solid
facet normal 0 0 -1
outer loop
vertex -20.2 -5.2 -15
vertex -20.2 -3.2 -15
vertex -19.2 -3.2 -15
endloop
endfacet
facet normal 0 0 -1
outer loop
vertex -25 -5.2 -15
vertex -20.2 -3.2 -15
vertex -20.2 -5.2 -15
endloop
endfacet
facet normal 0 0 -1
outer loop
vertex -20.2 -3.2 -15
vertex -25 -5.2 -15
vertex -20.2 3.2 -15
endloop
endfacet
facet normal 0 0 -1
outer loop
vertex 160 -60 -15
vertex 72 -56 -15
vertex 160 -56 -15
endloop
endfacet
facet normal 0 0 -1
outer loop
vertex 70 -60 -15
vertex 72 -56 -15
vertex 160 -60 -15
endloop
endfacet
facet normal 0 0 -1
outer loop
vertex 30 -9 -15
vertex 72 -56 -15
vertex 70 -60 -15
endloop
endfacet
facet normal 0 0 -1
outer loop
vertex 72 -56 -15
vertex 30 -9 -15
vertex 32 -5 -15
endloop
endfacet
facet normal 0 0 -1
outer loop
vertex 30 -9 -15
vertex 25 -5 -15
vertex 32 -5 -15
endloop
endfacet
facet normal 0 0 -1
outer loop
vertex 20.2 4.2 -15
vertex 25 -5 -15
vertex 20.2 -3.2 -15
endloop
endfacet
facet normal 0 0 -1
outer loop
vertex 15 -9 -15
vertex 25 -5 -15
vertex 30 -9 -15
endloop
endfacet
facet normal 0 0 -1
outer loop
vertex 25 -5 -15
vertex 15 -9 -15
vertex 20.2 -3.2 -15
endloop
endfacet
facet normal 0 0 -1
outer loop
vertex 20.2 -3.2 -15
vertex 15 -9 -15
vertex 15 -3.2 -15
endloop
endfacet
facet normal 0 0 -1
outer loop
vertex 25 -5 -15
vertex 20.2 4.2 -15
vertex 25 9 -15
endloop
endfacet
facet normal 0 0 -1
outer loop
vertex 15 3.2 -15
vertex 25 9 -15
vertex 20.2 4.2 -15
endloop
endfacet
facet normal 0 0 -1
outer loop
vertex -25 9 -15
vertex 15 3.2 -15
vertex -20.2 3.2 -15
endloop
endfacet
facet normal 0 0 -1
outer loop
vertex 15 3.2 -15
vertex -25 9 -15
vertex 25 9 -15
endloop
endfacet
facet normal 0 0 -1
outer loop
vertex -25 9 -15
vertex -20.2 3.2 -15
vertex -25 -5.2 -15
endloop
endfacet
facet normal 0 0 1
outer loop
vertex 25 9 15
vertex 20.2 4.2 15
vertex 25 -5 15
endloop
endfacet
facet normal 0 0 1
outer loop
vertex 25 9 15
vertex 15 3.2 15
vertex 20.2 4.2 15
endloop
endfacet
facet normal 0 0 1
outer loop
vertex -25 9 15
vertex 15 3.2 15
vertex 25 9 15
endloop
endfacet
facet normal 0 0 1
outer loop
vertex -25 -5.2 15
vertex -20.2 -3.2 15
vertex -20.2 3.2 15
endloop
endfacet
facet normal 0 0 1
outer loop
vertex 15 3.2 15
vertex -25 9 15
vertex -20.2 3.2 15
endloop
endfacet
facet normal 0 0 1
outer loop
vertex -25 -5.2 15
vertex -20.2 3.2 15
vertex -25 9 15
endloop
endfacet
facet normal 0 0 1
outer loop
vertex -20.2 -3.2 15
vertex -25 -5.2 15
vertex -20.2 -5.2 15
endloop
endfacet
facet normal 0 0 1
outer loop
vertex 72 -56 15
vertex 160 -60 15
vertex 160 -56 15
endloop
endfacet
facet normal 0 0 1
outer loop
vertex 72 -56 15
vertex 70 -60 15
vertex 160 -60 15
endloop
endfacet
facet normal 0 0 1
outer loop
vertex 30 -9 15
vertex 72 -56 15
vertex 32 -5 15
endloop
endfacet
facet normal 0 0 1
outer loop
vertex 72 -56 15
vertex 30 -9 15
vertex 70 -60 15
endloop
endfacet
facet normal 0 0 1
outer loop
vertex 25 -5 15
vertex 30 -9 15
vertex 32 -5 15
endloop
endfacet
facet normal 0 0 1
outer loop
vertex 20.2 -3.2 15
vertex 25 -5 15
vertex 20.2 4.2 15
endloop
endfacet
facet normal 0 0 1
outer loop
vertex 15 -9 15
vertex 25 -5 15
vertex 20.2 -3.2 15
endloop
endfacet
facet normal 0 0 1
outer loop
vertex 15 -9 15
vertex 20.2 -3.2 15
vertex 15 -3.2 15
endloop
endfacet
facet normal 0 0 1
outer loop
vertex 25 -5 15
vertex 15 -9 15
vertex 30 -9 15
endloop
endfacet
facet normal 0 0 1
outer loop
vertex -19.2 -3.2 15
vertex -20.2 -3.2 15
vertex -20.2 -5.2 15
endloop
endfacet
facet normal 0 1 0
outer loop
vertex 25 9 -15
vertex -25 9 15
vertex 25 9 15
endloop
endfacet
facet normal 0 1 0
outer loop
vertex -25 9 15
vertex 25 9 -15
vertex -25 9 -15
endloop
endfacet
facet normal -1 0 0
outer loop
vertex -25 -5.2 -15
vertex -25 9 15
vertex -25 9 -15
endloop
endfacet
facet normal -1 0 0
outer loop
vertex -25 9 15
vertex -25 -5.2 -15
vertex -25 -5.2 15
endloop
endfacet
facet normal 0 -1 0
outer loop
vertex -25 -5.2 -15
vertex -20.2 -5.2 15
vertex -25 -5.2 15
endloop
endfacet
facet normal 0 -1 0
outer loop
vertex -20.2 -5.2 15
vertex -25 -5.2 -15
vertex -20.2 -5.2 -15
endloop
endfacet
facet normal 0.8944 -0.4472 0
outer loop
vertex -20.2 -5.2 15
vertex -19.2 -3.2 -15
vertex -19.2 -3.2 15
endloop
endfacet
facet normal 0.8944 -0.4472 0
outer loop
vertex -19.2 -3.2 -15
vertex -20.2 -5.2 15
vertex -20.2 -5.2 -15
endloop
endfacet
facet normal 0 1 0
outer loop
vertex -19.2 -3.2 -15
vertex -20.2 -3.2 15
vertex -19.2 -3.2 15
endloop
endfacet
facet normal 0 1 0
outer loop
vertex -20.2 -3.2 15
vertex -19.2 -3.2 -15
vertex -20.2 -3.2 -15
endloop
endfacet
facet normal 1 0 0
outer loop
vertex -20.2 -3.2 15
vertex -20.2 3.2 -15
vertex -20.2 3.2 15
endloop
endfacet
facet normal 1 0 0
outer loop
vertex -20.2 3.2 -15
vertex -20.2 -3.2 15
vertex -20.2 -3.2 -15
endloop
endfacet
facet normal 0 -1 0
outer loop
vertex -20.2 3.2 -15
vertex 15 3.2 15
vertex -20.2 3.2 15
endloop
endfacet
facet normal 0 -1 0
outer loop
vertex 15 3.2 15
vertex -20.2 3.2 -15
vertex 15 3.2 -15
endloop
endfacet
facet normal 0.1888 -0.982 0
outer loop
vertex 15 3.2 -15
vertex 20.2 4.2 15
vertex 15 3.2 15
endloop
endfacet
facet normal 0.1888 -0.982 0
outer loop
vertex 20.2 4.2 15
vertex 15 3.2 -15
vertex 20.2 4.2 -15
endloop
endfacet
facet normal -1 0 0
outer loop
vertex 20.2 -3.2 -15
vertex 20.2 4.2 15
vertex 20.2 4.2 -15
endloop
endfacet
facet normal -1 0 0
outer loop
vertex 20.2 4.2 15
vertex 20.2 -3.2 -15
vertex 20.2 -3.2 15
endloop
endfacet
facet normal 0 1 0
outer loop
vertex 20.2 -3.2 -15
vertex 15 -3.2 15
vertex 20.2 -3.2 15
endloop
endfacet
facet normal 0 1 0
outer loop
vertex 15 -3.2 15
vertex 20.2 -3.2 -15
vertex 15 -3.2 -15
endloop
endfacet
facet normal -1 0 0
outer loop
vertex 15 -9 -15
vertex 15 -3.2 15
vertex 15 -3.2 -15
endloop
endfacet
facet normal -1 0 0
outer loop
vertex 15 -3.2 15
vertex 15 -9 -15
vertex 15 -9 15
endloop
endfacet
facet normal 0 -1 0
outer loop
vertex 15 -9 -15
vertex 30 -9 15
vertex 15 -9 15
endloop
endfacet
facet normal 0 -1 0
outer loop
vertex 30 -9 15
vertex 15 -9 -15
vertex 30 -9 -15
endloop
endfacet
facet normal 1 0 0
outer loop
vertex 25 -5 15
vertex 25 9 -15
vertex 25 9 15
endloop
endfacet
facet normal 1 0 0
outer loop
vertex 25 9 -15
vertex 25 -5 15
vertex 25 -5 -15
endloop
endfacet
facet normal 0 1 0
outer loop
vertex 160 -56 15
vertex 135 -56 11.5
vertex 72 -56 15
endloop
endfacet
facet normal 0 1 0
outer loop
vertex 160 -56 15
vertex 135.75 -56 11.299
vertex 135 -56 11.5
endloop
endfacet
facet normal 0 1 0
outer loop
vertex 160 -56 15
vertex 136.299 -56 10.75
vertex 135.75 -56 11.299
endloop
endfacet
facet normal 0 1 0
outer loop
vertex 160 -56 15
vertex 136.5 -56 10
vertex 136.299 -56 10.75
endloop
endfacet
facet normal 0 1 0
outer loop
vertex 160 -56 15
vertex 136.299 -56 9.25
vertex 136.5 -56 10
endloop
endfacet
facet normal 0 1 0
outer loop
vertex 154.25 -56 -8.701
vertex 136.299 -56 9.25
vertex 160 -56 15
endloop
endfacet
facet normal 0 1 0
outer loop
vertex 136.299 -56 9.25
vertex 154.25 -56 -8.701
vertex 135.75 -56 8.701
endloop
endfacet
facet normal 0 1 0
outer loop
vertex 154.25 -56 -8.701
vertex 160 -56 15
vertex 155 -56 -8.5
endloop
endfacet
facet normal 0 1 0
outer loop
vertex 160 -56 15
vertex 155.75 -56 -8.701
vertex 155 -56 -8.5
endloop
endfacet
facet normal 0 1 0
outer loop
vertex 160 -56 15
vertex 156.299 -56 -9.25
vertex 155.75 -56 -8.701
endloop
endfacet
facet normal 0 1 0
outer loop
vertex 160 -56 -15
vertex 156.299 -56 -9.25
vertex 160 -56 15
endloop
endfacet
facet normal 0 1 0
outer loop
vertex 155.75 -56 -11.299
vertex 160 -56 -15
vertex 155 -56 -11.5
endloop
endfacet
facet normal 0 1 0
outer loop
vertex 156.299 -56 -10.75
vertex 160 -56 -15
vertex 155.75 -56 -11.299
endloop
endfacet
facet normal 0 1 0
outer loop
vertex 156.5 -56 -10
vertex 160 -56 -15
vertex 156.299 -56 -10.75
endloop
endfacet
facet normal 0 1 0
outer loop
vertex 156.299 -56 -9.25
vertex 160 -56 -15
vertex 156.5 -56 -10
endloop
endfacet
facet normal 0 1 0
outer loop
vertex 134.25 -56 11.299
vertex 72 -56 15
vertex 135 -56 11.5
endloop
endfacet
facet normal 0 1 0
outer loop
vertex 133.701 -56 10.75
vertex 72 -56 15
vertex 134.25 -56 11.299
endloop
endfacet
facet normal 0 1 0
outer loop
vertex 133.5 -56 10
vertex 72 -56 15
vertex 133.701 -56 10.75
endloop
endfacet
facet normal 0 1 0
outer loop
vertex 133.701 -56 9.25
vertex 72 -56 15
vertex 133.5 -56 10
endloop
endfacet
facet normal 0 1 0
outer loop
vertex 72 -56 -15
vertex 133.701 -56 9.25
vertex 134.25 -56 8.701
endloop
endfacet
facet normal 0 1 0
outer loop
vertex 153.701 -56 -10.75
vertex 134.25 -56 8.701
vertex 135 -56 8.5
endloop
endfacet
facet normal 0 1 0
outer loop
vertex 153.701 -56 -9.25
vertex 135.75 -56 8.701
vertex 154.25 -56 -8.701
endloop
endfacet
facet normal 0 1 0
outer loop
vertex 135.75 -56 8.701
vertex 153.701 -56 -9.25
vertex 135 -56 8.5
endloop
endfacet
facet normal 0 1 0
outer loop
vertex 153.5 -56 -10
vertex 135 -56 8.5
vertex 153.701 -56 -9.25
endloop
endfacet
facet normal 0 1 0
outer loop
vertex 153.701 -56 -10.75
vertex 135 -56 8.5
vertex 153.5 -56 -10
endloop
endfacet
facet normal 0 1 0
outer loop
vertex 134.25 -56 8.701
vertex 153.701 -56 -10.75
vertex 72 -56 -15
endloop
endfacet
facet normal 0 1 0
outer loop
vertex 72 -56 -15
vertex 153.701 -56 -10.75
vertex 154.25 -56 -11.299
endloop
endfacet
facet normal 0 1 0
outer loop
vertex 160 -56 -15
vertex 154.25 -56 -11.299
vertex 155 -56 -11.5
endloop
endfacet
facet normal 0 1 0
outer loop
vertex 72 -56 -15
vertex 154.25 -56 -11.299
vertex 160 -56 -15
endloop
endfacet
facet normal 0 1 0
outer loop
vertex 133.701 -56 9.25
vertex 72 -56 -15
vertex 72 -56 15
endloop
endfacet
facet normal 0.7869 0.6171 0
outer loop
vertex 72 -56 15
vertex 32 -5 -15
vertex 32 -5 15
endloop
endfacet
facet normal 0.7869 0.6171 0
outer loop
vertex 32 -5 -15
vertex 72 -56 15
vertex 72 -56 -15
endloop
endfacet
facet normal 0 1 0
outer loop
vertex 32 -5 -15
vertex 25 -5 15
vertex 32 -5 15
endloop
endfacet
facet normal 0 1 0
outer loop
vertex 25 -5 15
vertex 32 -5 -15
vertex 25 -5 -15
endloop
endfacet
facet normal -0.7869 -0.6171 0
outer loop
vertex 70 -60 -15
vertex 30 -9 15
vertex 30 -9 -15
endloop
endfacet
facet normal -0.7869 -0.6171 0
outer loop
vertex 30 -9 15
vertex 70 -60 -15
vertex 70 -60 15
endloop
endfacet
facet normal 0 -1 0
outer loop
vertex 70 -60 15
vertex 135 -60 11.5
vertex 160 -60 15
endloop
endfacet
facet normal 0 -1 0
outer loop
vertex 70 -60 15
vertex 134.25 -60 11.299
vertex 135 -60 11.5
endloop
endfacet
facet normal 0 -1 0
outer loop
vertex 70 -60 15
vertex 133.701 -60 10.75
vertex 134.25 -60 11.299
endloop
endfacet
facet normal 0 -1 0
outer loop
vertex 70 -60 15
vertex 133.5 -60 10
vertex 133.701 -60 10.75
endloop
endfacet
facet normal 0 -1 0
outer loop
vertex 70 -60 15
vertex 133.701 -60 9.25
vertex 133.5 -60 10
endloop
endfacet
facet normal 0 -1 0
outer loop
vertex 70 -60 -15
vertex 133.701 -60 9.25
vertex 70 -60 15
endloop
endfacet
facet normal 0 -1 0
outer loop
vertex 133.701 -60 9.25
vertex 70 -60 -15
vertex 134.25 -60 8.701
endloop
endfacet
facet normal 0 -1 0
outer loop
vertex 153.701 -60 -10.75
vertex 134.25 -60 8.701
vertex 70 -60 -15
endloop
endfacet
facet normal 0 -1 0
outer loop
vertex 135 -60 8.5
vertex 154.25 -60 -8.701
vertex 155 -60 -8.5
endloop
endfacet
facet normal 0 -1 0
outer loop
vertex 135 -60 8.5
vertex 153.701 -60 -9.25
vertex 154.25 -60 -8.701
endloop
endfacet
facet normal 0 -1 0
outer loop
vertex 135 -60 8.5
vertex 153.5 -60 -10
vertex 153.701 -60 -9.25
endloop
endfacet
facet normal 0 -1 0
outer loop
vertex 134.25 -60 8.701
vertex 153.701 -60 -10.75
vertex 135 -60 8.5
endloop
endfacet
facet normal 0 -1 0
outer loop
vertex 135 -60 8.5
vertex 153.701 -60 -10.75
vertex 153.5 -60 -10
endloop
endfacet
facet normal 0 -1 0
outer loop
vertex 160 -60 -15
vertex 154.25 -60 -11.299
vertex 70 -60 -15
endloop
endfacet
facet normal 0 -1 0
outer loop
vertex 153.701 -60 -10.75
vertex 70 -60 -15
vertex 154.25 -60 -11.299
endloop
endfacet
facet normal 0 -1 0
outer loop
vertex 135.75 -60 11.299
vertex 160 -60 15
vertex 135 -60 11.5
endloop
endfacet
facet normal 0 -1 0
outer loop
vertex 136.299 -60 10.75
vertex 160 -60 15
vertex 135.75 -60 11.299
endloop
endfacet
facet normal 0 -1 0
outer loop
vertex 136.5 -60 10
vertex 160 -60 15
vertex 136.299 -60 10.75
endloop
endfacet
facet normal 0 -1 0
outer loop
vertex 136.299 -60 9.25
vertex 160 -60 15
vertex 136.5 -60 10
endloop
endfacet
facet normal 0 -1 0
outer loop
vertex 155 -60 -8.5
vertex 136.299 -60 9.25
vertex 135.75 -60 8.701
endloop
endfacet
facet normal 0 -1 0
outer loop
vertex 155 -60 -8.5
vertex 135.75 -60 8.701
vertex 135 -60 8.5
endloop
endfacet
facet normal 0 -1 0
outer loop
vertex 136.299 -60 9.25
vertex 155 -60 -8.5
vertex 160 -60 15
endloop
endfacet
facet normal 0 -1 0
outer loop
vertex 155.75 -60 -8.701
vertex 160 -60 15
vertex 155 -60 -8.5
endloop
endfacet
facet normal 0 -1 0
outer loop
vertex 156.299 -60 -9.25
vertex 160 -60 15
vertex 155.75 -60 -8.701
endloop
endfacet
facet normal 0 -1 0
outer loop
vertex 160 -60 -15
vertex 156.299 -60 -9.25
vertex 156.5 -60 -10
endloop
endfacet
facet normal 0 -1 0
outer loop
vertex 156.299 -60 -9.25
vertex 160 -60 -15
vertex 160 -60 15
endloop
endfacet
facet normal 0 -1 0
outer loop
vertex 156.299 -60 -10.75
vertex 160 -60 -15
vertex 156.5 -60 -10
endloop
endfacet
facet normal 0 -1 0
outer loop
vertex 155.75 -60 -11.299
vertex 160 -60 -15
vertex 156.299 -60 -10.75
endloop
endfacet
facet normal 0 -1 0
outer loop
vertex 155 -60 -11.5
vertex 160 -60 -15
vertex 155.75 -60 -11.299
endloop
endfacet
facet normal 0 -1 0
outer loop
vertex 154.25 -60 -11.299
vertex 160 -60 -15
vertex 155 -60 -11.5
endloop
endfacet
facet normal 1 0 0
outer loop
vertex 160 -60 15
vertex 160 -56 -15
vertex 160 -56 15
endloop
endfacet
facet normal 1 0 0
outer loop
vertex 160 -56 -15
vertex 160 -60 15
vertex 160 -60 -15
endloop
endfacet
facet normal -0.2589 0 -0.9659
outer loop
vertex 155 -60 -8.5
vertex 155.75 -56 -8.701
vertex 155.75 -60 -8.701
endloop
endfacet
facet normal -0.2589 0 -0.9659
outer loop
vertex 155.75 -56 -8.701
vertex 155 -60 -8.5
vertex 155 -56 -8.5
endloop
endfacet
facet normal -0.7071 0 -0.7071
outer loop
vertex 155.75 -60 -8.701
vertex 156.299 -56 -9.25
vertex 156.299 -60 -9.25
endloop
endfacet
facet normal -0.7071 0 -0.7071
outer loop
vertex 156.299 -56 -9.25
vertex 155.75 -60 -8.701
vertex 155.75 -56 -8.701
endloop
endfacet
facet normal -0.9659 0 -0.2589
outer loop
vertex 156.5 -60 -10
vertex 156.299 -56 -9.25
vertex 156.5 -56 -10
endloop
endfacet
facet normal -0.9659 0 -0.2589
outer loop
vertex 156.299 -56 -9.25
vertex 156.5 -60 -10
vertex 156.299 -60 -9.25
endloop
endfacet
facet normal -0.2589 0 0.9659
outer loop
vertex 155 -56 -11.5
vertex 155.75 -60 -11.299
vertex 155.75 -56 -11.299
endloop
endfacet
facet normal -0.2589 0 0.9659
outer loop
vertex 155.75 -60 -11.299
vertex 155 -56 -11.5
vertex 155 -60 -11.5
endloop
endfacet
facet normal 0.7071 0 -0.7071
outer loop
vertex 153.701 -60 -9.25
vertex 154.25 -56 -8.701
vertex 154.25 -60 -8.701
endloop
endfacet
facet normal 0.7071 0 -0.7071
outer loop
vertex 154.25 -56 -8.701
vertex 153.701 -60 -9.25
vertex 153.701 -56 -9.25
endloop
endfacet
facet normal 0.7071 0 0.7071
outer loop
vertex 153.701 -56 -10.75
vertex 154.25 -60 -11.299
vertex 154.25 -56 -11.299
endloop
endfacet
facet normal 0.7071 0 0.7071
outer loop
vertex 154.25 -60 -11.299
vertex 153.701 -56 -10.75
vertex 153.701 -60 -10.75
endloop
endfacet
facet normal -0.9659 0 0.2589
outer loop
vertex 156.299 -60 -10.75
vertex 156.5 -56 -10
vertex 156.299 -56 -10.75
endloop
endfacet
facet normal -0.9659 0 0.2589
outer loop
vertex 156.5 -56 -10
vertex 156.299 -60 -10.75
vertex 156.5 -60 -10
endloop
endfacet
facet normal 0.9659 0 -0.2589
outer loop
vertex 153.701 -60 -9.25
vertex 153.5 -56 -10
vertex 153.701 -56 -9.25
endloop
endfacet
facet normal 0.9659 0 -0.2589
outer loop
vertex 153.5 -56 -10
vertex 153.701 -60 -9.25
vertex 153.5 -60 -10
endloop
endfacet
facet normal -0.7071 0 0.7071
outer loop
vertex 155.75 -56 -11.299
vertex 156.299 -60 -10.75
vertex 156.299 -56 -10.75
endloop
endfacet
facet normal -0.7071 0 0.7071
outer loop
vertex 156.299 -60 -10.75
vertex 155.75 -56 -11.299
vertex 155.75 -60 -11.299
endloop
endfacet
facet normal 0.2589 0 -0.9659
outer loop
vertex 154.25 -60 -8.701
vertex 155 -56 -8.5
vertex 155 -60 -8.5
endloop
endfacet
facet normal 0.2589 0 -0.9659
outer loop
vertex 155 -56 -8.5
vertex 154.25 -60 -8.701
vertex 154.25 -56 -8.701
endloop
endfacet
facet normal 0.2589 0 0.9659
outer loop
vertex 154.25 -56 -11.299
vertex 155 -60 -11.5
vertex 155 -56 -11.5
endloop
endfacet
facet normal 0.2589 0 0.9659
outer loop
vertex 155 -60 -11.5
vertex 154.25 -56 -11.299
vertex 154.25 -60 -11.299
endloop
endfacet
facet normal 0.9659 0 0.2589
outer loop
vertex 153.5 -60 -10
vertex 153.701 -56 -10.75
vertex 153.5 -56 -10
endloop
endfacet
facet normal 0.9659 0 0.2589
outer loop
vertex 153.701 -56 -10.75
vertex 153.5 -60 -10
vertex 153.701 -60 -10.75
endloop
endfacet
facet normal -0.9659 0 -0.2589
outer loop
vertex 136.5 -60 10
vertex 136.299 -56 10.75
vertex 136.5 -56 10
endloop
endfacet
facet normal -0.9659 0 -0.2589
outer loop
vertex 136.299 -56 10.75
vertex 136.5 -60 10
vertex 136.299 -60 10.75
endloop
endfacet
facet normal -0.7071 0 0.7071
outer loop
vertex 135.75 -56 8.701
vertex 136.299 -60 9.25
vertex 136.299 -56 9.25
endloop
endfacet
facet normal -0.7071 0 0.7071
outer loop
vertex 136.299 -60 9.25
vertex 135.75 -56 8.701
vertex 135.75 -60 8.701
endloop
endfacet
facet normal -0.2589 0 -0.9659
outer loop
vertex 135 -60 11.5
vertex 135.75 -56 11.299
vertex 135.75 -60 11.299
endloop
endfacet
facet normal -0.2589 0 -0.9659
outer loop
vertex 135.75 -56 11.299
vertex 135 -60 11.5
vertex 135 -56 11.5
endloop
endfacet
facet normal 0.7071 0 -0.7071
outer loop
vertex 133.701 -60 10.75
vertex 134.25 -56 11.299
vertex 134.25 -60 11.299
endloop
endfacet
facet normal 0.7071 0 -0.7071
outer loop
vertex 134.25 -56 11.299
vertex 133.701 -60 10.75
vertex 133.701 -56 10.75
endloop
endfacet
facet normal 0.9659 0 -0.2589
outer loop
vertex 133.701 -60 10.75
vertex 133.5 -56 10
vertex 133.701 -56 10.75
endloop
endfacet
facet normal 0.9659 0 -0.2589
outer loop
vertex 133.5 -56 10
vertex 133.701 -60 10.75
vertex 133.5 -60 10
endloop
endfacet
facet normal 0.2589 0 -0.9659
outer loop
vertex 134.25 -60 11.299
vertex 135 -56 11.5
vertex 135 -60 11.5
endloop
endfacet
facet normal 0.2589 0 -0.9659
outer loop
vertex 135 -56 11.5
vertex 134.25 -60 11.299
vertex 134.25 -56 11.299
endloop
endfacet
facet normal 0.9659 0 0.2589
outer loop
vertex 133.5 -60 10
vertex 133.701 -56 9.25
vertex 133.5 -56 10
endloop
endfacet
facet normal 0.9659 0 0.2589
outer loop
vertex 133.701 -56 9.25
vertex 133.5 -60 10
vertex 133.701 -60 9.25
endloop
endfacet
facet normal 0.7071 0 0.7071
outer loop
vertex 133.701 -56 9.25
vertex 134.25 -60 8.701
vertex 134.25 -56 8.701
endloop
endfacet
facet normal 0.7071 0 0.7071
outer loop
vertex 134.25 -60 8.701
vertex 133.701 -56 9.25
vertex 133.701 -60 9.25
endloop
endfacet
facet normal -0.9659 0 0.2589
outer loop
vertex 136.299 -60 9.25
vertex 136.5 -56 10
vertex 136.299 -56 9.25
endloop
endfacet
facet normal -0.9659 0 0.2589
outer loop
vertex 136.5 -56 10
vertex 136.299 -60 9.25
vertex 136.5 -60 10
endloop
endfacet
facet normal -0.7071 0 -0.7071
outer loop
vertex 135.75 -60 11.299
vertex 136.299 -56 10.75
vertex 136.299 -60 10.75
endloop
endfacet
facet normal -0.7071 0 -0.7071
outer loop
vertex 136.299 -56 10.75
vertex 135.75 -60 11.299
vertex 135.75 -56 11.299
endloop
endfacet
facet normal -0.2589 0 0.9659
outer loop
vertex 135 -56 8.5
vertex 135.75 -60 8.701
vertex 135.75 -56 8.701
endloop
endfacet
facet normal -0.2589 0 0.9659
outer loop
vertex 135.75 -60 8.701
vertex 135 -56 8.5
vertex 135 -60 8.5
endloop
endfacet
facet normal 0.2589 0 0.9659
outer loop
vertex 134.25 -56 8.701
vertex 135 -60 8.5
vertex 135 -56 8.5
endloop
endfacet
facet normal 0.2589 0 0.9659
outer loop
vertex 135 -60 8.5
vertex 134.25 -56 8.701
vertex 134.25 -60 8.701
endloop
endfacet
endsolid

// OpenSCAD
frame_cube=[40.4,6.4,50];


snapon_points=[
 // bottom part near frame
 [-frame_cube[0]/2,frame_cube[1]/2],[-frame_cube[0]/2,-frame_cube[1]/2],
 // click notch slightly up
 [-frame_cube[0]/2+1,-frame_cube[1]/2],[-frame_cube[0]/2,-frame_cube[1]/2-2],
 // bottom edge
 [-25,-frame_cube[1]/2-2],[-25,9],
 // back side
 [25,9],[25,-9],
 // holder notch
 [15,-9],[15,-frame_cube[1]/2],[frame_cube[0]/2,-frame_cube[1]/2],
 // angled insertion helper
 [frame_cube[0]/2,frame_cube[1]/2+1],[15,frame_cube[1]/2]
 // insertion
];

extbar_points = [
  // go up
  [25,-9], [30,-9],
  // lean forward
  [70,-60], [160, -60],
  // back side return
  [160, -56], [72, -56],
  // return down
  [32,-5], [25,-5]
];

module frame()
{
  cube(frame_cube,center=true);
}

module mounting_holes_cutter()
{
  // [[4.5,-6],[11.5,10]];
  offset=[145,-60,0];
  holes_pos=[[offset[0]+10,offset[1],offset[2]-10],[offset[0]-10,offset[1],offset[2]+10]];
  for(i=[0,1])
    translate(holes_pos[i])
      rotate([90,0,0])
      cylinder(d=3,h=20,$fn=12,center=true);
}

module snapon_clip()
{
  linear_extrude(30,center=true)
  polygon(points=snapon_points);
}

module snapon_clip_with_holes()
{
  difference()
  {
    union()
    {
      snapon_clip();
      extension_bar();
    }
    mounting_holes_cutter();
  }
}

module extension_bar()
{
  linear_extrude(30,center=true)
  polygon(points=extbar_points);
}

%frame();
snapon_clip_with_holes();
